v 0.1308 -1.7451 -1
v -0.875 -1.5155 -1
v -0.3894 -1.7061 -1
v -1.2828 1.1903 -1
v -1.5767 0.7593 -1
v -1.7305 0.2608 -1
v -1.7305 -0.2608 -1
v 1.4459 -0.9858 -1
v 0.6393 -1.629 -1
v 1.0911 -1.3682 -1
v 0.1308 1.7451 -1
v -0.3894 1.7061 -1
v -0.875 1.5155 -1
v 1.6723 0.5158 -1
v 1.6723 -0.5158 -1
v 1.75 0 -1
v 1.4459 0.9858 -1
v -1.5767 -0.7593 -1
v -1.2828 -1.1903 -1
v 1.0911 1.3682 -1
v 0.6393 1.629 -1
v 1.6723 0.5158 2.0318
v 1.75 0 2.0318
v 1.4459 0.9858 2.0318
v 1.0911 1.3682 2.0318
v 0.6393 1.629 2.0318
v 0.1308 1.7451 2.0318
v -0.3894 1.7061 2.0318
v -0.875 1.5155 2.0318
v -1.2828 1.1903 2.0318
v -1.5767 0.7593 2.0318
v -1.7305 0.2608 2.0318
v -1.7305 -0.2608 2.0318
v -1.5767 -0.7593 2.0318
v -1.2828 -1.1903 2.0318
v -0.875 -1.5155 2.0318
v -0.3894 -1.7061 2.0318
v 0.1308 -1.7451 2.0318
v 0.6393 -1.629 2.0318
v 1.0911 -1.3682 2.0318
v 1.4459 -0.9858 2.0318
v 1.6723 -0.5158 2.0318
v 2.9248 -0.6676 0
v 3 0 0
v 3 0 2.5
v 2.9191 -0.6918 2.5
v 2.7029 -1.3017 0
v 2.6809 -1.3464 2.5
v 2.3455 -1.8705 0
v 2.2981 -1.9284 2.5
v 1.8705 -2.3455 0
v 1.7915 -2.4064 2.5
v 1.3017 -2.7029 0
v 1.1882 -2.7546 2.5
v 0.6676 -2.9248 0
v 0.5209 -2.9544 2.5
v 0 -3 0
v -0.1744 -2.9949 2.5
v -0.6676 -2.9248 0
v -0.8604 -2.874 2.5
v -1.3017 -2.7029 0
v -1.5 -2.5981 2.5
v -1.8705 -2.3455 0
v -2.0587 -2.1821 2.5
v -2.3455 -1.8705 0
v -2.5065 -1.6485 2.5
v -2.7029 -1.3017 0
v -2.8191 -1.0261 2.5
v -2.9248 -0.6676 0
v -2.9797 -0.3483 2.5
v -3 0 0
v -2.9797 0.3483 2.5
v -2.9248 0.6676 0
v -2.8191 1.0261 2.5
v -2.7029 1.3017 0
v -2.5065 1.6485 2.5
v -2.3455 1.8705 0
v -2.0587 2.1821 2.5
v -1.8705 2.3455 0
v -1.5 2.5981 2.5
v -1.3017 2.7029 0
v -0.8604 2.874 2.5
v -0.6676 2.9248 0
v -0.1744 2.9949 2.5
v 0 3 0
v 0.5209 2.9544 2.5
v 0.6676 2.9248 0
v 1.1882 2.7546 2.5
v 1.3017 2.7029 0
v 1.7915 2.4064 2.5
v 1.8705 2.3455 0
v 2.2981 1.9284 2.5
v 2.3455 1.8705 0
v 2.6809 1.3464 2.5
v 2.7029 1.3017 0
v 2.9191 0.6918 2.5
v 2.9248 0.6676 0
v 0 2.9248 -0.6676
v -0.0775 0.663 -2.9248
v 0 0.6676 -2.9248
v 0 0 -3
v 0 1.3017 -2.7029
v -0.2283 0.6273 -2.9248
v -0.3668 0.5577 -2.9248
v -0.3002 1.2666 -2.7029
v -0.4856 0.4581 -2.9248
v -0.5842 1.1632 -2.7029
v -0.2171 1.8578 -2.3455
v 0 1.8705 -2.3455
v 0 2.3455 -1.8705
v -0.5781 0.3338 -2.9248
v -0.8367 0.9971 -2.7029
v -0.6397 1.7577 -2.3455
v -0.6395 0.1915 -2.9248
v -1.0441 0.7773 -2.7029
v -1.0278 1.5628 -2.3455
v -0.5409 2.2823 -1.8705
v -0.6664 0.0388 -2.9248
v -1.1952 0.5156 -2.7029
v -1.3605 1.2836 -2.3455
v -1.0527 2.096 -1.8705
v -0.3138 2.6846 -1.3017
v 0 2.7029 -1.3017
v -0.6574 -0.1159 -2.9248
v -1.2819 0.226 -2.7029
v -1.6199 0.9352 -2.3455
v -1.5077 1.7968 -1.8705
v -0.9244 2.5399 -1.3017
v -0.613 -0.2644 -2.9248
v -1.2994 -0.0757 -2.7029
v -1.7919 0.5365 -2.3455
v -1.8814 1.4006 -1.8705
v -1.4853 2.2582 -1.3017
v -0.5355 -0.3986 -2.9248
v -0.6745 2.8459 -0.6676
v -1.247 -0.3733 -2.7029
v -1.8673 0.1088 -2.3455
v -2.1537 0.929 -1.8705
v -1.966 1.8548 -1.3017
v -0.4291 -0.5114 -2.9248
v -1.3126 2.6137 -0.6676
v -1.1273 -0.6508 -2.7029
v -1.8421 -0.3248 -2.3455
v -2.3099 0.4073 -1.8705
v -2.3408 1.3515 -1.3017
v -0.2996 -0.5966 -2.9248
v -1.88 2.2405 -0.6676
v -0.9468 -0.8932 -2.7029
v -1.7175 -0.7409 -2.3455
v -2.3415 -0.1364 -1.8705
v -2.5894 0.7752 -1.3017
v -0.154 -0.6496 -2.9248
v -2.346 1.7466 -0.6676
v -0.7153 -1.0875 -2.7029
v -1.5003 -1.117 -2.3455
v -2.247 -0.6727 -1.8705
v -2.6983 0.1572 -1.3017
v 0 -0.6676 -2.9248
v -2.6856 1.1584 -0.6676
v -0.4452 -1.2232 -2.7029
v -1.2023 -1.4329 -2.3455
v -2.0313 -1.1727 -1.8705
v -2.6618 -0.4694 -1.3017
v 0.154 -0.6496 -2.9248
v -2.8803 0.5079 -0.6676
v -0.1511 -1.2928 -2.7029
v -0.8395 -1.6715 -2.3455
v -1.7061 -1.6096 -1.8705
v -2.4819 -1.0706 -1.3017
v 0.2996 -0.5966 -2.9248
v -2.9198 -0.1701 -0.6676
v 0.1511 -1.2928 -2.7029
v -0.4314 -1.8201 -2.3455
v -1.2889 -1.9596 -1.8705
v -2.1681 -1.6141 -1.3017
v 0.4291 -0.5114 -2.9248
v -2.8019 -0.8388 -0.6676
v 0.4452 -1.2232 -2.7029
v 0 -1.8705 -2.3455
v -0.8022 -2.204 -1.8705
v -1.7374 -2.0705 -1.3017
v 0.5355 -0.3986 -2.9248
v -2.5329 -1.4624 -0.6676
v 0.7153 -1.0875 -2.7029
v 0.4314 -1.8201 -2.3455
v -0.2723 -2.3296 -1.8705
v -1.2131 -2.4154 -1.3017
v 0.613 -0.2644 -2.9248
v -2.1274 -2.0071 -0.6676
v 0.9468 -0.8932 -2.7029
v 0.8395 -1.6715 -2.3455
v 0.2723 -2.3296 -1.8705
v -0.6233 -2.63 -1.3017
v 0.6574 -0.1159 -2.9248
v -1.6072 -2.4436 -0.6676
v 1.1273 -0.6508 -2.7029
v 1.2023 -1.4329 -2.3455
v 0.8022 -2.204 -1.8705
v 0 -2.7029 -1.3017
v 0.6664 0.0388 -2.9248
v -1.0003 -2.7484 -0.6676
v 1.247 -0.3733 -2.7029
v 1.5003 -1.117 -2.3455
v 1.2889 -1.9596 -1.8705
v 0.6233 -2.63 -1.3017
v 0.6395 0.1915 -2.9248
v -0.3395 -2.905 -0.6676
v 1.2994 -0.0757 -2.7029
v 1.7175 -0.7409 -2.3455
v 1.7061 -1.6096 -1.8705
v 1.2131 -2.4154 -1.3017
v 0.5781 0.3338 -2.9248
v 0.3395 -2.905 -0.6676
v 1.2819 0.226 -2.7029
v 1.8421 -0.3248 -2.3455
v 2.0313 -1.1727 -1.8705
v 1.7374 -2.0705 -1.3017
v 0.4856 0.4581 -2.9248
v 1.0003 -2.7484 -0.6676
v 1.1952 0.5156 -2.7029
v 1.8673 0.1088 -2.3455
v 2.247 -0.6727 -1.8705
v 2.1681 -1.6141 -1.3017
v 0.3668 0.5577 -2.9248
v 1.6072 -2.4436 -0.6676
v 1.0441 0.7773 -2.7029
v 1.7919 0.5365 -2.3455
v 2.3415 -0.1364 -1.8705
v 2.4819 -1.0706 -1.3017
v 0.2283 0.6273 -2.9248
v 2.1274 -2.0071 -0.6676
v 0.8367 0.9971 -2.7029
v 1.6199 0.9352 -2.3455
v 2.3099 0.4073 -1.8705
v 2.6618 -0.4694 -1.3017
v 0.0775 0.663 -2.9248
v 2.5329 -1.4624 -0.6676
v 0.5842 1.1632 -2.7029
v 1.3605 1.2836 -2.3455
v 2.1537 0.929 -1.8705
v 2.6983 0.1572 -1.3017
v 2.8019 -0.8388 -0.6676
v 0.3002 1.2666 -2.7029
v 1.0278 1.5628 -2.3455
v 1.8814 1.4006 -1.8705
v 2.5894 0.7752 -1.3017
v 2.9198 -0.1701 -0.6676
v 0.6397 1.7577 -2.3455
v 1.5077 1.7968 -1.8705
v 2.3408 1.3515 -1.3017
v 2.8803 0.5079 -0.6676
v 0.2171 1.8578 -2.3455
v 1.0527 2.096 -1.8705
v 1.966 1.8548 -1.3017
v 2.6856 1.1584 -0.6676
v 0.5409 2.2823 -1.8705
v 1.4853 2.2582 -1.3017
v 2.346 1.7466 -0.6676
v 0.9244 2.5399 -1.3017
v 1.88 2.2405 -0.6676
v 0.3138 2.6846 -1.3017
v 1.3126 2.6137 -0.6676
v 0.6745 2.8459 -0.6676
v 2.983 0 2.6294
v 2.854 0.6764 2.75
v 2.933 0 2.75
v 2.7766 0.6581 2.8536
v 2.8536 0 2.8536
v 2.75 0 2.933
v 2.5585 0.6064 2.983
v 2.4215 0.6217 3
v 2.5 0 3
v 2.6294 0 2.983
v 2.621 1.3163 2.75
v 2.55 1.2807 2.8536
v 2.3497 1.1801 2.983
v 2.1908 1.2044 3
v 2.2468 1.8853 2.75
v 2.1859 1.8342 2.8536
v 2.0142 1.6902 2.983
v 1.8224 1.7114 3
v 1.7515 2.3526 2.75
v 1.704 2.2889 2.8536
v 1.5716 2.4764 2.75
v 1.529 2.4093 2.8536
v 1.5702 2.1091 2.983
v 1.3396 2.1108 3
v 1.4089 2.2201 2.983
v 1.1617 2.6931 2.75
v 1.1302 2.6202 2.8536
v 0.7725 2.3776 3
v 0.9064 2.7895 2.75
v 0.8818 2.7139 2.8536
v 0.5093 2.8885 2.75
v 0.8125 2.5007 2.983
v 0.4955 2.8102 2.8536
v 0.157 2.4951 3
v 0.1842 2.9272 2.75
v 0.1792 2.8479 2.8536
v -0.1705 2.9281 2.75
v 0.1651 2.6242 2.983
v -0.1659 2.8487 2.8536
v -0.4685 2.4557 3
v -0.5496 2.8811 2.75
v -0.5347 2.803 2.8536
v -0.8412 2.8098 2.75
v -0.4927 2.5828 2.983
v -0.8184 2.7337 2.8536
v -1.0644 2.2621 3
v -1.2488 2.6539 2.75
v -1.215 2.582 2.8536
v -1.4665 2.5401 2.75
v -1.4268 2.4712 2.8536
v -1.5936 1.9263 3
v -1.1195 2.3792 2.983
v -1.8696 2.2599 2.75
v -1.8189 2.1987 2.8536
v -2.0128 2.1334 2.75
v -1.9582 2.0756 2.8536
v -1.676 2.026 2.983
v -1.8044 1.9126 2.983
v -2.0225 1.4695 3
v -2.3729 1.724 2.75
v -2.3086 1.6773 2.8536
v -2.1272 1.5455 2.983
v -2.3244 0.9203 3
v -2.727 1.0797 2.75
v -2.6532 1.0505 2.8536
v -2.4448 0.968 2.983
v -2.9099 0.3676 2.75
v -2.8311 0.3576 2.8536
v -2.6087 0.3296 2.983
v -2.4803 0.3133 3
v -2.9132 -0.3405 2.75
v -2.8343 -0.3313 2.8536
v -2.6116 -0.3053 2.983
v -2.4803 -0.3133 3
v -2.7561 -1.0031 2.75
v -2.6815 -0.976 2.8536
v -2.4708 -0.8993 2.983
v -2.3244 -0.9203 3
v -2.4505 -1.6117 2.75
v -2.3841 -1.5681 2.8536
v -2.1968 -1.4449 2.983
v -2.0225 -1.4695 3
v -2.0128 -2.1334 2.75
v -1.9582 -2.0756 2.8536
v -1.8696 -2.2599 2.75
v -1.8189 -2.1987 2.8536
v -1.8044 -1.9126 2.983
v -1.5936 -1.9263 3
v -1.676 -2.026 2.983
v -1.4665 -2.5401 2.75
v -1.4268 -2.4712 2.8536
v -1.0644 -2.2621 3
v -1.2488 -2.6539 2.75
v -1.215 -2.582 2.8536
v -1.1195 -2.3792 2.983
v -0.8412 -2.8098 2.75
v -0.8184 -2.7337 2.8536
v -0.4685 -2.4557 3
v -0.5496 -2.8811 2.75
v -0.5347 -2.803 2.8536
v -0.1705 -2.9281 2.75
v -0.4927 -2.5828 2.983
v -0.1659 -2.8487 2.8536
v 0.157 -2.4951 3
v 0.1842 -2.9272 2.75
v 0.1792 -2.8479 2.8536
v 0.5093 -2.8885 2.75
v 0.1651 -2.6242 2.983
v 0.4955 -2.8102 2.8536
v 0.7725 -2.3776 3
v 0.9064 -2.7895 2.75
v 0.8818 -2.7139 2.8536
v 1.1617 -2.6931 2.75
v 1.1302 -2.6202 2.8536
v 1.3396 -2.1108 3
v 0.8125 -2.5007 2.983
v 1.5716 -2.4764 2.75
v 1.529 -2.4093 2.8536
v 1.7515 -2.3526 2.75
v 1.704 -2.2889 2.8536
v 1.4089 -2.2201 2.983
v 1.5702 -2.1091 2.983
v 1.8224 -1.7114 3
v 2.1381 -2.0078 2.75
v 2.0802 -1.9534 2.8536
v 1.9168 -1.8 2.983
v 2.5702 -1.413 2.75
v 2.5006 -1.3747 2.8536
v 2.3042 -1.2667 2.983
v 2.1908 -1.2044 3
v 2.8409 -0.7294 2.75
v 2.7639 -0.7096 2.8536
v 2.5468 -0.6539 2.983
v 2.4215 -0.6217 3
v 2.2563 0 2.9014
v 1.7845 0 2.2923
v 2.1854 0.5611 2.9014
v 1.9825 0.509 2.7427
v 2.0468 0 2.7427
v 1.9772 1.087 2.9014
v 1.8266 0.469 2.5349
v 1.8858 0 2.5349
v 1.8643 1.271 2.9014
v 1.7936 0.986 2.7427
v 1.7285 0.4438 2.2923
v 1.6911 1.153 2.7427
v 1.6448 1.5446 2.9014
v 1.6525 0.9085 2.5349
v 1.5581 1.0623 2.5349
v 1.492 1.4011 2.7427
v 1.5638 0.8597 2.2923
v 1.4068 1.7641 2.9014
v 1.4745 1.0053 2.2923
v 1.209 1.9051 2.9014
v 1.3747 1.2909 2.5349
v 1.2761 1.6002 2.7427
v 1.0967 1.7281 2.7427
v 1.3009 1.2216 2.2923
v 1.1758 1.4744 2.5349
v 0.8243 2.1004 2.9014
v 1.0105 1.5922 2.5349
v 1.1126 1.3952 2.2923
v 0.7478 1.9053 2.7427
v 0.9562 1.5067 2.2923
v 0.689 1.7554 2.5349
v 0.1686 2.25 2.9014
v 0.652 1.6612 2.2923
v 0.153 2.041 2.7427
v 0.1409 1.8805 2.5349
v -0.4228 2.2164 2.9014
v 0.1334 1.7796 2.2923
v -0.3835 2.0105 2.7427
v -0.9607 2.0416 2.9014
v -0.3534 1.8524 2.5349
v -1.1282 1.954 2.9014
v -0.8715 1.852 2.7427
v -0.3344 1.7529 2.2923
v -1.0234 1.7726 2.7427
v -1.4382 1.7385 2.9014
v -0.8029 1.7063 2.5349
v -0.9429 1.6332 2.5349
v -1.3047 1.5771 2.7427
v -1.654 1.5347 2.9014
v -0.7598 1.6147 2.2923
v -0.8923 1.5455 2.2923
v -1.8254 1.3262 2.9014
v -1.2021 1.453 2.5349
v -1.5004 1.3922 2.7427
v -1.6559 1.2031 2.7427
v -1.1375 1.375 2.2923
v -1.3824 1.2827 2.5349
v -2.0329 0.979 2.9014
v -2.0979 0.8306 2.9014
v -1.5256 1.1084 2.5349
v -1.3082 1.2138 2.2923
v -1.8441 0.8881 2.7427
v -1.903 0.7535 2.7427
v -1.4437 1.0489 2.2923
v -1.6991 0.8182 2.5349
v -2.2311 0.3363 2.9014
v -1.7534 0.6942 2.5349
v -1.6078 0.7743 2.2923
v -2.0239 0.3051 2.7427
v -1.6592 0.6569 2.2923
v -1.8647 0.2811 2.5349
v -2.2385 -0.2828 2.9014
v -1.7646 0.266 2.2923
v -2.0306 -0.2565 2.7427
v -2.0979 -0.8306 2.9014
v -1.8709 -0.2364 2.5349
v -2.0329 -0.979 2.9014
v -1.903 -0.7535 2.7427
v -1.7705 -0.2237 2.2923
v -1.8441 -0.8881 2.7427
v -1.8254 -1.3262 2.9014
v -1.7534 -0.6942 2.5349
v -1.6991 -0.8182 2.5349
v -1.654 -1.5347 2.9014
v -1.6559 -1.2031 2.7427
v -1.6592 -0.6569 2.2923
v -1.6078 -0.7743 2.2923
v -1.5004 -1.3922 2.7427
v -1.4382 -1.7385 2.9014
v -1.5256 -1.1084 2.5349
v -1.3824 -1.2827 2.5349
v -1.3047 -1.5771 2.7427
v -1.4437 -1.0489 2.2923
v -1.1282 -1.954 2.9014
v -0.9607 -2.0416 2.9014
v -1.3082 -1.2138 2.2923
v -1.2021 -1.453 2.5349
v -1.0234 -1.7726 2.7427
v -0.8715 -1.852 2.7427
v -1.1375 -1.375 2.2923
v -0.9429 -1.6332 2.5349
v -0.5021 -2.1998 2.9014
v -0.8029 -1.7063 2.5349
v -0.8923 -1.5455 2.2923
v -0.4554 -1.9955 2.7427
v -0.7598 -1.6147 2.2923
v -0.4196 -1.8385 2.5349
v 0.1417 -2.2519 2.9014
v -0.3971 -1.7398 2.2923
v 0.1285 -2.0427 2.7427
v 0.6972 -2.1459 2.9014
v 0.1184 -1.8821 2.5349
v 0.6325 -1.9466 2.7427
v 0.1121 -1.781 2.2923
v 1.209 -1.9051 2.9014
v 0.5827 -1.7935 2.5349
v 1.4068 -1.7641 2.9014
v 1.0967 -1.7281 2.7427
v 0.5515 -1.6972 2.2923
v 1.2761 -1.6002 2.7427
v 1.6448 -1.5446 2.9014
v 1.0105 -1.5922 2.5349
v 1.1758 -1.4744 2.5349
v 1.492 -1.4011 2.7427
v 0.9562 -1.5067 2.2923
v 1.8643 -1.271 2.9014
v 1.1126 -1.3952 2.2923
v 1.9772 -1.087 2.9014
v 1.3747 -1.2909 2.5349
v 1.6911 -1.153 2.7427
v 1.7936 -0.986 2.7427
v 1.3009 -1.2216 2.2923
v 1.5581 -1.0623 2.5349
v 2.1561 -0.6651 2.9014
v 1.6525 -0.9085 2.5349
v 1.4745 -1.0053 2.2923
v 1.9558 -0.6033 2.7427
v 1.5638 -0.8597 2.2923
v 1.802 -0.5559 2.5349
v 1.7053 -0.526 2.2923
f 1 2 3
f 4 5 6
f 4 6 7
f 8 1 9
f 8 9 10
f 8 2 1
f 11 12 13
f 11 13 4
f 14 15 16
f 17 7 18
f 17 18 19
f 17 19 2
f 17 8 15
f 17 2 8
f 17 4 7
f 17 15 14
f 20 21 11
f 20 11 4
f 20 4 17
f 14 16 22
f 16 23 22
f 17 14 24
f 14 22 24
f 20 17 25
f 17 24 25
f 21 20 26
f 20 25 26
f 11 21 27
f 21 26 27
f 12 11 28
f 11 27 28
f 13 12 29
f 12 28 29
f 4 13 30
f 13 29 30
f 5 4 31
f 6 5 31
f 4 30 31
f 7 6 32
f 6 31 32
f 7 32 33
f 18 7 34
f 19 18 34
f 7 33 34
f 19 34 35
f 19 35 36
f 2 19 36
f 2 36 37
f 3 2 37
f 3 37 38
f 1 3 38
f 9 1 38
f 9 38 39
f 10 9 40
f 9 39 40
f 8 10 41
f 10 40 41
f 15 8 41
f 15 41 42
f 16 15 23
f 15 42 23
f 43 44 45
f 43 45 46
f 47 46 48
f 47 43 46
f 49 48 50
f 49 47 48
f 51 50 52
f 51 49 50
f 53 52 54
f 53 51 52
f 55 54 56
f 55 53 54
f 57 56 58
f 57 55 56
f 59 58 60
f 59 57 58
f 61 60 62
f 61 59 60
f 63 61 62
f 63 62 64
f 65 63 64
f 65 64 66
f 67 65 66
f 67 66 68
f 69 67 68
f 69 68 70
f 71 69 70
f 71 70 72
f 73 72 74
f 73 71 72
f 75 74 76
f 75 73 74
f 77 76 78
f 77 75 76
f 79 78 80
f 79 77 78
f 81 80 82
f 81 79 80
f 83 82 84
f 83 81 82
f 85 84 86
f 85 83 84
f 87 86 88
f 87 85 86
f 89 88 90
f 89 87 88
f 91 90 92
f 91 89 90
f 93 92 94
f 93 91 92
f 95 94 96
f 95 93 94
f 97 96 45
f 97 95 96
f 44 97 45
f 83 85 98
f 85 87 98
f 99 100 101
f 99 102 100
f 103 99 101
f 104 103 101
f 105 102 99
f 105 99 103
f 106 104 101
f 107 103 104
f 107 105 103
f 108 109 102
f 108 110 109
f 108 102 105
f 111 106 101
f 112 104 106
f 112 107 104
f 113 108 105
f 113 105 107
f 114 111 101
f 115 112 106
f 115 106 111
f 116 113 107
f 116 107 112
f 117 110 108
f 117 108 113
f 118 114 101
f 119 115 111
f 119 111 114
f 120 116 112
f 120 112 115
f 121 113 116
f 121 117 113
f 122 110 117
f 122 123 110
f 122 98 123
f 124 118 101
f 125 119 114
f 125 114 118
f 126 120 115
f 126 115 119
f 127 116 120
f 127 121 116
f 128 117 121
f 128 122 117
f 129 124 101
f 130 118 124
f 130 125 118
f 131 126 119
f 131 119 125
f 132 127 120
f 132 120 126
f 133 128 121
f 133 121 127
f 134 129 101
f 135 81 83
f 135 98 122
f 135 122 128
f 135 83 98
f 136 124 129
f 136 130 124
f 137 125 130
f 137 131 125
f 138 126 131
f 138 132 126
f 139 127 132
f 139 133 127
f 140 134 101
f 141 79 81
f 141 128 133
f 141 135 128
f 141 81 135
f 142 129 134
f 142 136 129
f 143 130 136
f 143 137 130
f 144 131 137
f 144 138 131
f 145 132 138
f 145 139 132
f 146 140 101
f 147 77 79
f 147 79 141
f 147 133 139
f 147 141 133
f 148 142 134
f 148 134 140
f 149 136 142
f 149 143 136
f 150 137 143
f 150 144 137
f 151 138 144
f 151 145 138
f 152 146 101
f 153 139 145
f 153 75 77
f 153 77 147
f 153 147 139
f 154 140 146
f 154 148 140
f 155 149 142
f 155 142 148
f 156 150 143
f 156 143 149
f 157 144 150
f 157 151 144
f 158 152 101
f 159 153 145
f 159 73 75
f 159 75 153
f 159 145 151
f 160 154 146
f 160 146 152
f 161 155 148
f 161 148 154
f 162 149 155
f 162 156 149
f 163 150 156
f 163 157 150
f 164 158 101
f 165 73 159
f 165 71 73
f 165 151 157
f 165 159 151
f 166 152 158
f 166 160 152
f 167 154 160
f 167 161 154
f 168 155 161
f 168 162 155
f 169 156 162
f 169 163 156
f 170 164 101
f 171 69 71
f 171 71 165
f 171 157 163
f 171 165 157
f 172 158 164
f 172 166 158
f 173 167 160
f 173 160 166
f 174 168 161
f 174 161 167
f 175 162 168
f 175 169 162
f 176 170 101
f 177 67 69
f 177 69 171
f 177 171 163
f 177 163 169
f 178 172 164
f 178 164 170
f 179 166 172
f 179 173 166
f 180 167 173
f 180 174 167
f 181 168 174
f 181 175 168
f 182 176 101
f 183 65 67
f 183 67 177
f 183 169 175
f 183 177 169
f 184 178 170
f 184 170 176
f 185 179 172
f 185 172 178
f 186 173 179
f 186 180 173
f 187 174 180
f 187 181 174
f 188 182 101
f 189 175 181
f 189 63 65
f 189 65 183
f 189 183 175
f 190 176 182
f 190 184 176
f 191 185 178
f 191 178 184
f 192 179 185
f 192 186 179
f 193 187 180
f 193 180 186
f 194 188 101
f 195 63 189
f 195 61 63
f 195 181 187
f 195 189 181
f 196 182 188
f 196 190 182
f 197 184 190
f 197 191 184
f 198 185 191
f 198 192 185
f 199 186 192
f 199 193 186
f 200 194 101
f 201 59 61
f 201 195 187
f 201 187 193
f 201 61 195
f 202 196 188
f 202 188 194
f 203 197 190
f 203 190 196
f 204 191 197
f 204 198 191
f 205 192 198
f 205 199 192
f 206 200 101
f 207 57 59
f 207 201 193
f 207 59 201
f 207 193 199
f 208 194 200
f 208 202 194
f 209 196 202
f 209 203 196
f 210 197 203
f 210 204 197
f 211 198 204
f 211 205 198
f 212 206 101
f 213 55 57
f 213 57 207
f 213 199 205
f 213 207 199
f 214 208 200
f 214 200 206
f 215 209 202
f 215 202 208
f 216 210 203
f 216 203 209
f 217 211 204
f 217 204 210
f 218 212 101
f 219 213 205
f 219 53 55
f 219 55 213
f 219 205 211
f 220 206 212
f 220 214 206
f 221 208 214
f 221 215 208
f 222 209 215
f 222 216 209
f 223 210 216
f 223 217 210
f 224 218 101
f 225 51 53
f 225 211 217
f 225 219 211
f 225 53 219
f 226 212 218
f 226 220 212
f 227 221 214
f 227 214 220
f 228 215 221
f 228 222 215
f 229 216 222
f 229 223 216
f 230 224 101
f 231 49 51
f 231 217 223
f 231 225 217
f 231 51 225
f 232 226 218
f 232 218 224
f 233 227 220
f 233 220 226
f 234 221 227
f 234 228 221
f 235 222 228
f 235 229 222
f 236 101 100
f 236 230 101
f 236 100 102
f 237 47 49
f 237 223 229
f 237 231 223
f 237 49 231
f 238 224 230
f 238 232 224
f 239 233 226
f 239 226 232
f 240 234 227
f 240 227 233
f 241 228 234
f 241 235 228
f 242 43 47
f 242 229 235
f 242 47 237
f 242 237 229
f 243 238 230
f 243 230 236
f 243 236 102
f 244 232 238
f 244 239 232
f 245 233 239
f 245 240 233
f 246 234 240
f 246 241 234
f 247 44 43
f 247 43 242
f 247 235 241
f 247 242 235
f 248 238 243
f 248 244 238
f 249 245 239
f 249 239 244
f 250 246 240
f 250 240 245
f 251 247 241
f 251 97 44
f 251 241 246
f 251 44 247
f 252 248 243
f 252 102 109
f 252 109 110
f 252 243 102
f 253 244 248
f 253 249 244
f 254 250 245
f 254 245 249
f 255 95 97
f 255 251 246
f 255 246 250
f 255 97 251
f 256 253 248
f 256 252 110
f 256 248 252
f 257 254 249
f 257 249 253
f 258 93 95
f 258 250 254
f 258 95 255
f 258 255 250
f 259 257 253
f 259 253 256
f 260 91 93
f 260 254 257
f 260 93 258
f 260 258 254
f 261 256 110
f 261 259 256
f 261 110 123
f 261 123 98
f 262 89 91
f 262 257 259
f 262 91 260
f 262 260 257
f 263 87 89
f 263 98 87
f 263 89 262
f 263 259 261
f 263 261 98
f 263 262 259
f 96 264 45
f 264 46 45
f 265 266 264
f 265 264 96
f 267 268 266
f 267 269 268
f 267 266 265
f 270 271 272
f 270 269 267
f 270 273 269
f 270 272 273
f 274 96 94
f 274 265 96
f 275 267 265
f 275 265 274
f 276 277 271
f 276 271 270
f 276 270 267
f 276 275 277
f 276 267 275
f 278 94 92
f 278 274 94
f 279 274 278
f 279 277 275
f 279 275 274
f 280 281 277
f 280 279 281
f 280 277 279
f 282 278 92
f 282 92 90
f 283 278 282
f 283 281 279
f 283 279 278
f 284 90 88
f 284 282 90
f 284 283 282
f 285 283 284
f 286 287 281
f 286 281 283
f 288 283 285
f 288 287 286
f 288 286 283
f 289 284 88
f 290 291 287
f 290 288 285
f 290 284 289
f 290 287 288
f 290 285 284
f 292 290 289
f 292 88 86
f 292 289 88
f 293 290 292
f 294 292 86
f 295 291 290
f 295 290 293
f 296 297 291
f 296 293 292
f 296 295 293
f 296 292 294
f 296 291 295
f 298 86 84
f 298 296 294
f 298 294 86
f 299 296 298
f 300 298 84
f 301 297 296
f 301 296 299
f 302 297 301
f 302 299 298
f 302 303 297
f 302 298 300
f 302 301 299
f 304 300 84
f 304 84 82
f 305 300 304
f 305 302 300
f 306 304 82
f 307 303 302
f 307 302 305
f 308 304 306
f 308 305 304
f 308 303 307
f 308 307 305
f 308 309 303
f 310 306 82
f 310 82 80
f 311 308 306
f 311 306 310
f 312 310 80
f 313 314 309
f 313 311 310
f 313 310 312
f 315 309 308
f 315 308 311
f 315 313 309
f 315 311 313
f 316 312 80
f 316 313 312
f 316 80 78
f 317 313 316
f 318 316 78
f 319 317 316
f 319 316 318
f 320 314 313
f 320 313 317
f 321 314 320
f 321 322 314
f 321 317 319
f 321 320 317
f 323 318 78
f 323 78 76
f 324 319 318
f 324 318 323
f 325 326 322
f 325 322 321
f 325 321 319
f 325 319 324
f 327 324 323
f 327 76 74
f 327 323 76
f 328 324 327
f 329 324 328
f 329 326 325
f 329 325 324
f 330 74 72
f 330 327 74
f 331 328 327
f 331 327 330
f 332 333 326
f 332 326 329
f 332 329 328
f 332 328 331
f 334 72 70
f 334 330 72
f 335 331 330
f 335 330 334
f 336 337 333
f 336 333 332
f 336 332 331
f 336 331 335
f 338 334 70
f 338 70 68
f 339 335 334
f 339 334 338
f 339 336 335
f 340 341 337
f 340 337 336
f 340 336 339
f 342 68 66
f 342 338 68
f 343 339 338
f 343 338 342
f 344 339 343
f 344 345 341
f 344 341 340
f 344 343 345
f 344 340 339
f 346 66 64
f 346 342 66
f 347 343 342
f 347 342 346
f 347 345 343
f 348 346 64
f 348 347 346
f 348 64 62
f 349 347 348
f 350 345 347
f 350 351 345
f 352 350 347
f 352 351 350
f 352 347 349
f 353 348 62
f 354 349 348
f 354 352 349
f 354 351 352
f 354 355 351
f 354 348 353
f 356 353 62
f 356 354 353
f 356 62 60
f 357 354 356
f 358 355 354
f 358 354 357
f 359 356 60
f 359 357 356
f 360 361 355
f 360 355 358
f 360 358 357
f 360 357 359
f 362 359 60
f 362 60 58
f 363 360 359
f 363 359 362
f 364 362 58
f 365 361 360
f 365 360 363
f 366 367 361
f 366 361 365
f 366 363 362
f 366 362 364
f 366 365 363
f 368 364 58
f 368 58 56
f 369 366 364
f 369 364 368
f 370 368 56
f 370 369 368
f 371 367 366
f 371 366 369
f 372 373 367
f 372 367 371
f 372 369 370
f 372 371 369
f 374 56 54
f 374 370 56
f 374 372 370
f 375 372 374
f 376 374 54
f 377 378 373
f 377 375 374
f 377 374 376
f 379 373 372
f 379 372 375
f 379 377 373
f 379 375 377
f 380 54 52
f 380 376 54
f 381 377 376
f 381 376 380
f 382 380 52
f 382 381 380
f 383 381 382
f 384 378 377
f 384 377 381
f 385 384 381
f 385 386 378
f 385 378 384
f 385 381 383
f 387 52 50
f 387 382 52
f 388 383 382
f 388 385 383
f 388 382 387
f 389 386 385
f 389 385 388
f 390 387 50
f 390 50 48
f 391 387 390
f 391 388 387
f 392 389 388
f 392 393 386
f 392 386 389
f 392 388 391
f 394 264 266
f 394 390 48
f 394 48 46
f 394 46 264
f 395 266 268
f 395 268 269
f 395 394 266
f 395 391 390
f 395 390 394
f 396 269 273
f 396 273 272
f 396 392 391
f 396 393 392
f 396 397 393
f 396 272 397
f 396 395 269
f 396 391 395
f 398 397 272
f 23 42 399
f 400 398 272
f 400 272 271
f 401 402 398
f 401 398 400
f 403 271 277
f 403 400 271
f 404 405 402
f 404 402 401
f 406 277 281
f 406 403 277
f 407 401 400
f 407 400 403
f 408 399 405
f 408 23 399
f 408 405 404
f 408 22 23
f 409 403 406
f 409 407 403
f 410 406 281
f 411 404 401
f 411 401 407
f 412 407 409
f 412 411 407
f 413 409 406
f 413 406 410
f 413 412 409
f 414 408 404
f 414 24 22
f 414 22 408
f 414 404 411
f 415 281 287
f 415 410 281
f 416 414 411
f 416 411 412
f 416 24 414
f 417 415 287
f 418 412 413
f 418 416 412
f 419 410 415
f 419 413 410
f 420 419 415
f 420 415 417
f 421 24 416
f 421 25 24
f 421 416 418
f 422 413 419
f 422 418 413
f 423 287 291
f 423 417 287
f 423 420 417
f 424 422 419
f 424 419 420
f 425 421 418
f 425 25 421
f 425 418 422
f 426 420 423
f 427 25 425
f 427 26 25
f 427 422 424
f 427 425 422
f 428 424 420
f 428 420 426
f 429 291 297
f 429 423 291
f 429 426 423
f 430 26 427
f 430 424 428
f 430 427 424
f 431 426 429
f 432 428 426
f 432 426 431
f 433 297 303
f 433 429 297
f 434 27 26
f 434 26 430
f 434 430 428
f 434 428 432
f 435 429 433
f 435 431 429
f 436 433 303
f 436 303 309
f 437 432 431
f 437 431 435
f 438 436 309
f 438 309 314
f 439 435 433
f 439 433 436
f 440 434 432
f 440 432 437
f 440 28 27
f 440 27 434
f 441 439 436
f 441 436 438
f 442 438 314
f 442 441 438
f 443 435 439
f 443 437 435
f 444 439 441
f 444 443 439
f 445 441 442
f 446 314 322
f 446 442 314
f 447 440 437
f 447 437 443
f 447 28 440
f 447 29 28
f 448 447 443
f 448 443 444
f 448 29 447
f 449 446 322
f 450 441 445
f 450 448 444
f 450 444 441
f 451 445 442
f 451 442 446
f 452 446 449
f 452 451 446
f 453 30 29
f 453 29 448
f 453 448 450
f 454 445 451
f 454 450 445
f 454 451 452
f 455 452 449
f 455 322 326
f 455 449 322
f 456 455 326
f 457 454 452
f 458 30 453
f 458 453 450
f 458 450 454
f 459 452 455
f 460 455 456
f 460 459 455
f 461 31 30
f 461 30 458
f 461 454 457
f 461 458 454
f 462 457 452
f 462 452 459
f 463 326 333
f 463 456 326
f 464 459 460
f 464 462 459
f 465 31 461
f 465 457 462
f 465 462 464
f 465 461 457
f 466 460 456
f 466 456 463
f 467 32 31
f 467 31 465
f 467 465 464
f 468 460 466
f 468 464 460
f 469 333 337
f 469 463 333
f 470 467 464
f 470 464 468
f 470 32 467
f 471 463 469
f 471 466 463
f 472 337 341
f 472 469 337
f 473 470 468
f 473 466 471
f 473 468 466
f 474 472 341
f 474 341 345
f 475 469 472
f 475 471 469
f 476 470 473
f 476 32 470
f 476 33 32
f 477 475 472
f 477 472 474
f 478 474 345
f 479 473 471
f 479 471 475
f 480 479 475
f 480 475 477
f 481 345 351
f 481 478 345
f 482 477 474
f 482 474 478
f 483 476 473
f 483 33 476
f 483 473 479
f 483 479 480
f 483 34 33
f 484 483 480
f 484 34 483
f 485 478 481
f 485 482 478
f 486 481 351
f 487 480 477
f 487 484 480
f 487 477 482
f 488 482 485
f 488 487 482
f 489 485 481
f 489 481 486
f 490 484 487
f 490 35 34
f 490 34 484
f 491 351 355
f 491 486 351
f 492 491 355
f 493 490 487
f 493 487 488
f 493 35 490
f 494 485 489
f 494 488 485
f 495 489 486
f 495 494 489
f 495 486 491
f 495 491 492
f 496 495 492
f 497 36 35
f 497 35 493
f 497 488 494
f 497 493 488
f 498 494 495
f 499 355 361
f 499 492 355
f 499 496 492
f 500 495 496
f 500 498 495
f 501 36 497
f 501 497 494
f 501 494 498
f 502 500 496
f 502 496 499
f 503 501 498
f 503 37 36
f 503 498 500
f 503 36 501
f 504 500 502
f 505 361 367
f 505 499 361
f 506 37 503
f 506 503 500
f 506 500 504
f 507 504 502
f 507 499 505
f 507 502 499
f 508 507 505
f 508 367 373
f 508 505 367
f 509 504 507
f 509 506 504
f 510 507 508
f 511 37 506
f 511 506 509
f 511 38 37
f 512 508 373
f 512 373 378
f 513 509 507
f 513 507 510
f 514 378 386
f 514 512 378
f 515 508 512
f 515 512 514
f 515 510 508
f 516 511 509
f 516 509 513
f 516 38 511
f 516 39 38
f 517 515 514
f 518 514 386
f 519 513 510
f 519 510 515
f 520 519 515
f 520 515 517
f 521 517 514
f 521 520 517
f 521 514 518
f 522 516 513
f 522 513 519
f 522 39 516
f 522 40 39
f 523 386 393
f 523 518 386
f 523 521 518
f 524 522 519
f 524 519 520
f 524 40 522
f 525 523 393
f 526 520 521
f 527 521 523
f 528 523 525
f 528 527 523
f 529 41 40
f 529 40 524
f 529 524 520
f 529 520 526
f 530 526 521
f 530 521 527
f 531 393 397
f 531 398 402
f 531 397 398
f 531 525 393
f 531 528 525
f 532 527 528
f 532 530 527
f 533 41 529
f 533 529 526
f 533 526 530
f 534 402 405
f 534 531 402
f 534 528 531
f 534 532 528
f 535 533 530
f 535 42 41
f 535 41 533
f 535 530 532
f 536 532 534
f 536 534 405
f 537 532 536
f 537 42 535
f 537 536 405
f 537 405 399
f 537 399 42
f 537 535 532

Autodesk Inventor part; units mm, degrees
ref_plane "YZ Plane" through (0, 0, 0) normal (1, 0, 0) x (0, 1, 0)
ref_plane "XZ Plane" through (0, 0, 0) normal (0, 1, 0) x (-1, 0, 0)
ref_plane "XY Plane" through (0, 0, 0) normal (0, 0, 1) x (1, 0, 0)
sketch "Sketch1" plane through (0, 0, 0) normal (1, 0, 0) x (0, 1, 0)
  circle A0 centre (0, 0) radius 3
  line L0 (3.6994, 0) -> (-3.9504, 0)
  line L1 (0, 0) -> (0, -4.1151)
  point P0 (0, -3)
  point P1 (3, 0)
  dimension "d0" = 6
revolve "Revolution1" add sketch "Sketch1" angle 360 about axis through (0, 0, 0) along (0, 0, -1) picked at (1.6828, -1.0574) contours A0 L1 L0
sketch "Sketch2" plane through (0, 0, 0) normal (0, 0, 1) x (1, 0, 0)
  circle A0 centre (0, 0) radius 3 projected
extrude "Extrusion1" add sketch "Sketch2" along normal blind 3
sketch "Sketch3" plane through (0, 0, 3) normal (0, 0, 1) x (1, 0, 0)
  circle A0 centre (0, 0) radius 1.75
  dimension "d4" = 3.5
extrude "Extrusion2" cut sketch "Sketch3" against normal blind 4
thread "Thread1" size "M3x0.5" class "6H" standard "ANSI Metric M Profile" length 53
fillet "Fillet1" radius 0.5 1 edges at (-3, 0, 3)
fillet "Fillet2" radius 1 1 edges at (-1.75, 0, 3)
properties part number "torniquete"
